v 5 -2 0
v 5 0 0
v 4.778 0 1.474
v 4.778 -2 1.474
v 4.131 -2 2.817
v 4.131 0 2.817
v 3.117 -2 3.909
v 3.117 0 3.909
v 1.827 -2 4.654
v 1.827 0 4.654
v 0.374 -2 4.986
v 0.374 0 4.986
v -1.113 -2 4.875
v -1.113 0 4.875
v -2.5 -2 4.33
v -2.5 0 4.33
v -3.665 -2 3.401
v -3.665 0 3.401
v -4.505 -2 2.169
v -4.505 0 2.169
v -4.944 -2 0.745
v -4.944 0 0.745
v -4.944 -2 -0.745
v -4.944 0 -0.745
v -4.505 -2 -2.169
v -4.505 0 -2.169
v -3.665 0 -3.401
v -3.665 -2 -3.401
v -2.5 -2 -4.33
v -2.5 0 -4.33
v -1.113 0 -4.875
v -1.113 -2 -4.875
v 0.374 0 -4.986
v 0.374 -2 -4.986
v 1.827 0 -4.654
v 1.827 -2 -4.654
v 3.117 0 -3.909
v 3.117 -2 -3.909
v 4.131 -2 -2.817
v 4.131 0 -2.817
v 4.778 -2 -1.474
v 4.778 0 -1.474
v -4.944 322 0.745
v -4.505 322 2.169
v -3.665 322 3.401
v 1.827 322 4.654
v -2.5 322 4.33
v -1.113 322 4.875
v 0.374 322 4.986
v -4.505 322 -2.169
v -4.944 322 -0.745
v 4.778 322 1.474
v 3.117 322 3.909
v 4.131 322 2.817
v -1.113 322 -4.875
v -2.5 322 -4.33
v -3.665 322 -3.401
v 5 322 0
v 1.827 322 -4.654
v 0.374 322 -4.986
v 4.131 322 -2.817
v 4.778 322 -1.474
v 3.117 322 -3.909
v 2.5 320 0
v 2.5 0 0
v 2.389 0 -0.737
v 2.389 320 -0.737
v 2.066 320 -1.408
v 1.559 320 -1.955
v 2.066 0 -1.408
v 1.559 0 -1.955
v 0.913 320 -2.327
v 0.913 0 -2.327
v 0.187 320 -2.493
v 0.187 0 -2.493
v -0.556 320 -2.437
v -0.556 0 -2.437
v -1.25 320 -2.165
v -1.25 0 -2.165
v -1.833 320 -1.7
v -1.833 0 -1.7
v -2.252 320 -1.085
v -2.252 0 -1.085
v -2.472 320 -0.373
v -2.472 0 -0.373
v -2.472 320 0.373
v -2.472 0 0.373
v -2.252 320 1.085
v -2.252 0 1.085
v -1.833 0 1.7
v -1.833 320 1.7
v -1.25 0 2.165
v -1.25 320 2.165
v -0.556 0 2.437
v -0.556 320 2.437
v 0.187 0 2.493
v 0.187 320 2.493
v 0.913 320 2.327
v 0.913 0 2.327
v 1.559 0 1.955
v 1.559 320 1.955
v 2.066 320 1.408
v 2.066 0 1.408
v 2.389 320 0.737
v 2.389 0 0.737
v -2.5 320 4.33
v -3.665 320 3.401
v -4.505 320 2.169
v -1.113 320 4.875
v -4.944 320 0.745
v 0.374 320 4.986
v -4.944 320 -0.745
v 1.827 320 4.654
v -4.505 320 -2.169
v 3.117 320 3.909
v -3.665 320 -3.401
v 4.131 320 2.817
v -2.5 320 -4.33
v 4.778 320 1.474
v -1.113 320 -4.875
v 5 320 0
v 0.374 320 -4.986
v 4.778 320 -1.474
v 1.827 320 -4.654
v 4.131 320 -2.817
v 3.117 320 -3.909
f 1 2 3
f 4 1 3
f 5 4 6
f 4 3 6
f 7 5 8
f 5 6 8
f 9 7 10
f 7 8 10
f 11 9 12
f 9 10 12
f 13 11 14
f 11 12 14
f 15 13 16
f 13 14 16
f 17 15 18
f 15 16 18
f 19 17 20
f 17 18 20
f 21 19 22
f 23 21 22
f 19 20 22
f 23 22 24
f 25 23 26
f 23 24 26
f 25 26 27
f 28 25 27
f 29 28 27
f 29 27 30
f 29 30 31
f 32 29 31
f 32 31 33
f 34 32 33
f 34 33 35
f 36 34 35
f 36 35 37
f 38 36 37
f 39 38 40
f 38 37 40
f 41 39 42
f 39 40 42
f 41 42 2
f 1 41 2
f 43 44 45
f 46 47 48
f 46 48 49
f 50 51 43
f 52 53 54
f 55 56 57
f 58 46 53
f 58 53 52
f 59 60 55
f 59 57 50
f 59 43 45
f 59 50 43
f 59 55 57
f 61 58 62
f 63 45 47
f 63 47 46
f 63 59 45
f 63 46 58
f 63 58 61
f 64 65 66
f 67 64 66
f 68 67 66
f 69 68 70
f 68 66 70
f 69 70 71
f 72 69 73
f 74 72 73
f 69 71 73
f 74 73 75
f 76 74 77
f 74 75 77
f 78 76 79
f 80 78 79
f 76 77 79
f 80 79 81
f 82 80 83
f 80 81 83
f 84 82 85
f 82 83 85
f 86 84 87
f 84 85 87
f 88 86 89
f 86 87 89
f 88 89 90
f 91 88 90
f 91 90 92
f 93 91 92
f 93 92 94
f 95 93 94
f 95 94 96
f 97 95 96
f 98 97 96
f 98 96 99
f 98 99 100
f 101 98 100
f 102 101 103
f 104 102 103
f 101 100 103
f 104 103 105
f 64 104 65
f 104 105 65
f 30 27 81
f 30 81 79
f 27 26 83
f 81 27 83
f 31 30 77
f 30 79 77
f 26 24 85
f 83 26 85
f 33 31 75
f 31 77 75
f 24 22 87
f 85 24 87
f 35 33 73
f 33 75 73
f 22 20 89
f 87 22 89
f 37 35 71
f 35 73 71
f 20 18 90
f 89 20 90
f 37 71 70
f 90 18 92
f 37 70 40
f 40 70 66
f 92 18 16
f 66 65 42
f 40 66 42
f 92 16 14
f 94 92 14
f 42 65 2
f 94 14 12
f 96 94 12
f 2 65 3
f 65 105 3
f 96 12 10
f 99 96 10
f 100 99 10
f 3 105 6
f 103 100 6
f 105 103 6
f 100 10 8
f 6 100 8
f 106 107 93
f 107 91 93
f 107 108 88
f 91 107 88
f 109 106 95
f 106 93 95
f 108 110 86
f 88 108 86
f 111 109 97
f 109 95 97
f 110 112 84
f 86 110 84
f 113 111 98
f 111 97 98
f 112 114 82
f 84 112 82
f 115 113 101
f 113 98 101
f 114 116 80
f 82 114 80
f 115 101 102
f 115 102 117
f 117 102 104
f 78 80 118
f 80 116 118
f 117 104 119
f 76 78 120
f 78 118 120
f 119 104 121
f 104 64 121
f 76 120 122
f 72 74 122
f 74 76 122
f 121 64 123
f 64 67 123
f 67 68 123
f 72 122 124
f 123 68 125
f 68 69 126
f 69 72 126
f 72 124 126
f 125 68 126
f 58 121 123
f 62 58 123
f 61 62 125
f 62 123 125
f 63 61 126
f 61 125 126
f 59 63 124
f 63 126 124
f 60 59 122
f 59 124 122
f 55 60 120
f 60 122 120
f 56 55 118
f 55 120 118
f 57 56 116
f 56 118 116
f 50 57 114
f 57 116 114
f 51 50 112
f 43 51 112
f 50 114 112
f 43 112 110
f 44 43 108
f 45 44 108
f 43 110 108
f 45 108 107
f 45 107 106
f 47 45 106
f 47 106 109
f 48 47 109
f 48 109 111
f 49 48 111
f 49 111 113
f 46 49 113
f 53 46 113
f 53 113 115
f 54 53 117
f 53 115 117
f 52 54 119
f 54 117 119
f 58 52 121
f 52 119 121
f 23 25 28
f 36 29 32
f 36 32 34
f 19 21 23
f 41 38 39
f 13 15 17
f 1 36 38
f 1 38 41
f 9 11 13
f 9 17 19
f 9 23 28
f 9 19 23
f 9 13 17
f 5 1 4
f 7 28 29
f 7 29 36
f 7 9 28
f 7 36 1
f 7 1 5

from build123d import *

# Parameters (mm, degrees)
SKETCH1_R           = 2.5
BOSS_EXTRUDE1_DEPTH = 320
SKETCH2_R           = 5
BOSS_EXTRUDE2_DEPTH = 2
SKETCH3_R           = 5
BOSS_EXTRUDE3_DEPTH = 2


with BuildPart() as part:
    # Sketch1 → Boss-Extrude1 (new body)
    with BuildSketch(Plane(origin=(0, 0, 0), x_dir=(1, 0, 0), z_dir=(0, 1, 0))):
        Circle(SKETCH1_R)
    extrude(amount=BOSS_EXTRUDE1_DEPTH)

    # Sketch2 → Boss-Extrude2 (add)
    with BuildSketch(Plane.XZ):
        Circle(SKETCH2_R)
    extrude(amount=BOSS_EXTRUDE2_DEPTH)

    # Sketch3 → Boss-Extrude3 (add)
    with BuildSketch(Plane(origin=(0, 320, 0), x_dir=(1, 0, 0), z_dir=(0, 1, 0))):
        Circle(SKETCH3_R)
    extrude(amount=BOSS_EXTRUDE3_DEPTH)


solid = part.part
